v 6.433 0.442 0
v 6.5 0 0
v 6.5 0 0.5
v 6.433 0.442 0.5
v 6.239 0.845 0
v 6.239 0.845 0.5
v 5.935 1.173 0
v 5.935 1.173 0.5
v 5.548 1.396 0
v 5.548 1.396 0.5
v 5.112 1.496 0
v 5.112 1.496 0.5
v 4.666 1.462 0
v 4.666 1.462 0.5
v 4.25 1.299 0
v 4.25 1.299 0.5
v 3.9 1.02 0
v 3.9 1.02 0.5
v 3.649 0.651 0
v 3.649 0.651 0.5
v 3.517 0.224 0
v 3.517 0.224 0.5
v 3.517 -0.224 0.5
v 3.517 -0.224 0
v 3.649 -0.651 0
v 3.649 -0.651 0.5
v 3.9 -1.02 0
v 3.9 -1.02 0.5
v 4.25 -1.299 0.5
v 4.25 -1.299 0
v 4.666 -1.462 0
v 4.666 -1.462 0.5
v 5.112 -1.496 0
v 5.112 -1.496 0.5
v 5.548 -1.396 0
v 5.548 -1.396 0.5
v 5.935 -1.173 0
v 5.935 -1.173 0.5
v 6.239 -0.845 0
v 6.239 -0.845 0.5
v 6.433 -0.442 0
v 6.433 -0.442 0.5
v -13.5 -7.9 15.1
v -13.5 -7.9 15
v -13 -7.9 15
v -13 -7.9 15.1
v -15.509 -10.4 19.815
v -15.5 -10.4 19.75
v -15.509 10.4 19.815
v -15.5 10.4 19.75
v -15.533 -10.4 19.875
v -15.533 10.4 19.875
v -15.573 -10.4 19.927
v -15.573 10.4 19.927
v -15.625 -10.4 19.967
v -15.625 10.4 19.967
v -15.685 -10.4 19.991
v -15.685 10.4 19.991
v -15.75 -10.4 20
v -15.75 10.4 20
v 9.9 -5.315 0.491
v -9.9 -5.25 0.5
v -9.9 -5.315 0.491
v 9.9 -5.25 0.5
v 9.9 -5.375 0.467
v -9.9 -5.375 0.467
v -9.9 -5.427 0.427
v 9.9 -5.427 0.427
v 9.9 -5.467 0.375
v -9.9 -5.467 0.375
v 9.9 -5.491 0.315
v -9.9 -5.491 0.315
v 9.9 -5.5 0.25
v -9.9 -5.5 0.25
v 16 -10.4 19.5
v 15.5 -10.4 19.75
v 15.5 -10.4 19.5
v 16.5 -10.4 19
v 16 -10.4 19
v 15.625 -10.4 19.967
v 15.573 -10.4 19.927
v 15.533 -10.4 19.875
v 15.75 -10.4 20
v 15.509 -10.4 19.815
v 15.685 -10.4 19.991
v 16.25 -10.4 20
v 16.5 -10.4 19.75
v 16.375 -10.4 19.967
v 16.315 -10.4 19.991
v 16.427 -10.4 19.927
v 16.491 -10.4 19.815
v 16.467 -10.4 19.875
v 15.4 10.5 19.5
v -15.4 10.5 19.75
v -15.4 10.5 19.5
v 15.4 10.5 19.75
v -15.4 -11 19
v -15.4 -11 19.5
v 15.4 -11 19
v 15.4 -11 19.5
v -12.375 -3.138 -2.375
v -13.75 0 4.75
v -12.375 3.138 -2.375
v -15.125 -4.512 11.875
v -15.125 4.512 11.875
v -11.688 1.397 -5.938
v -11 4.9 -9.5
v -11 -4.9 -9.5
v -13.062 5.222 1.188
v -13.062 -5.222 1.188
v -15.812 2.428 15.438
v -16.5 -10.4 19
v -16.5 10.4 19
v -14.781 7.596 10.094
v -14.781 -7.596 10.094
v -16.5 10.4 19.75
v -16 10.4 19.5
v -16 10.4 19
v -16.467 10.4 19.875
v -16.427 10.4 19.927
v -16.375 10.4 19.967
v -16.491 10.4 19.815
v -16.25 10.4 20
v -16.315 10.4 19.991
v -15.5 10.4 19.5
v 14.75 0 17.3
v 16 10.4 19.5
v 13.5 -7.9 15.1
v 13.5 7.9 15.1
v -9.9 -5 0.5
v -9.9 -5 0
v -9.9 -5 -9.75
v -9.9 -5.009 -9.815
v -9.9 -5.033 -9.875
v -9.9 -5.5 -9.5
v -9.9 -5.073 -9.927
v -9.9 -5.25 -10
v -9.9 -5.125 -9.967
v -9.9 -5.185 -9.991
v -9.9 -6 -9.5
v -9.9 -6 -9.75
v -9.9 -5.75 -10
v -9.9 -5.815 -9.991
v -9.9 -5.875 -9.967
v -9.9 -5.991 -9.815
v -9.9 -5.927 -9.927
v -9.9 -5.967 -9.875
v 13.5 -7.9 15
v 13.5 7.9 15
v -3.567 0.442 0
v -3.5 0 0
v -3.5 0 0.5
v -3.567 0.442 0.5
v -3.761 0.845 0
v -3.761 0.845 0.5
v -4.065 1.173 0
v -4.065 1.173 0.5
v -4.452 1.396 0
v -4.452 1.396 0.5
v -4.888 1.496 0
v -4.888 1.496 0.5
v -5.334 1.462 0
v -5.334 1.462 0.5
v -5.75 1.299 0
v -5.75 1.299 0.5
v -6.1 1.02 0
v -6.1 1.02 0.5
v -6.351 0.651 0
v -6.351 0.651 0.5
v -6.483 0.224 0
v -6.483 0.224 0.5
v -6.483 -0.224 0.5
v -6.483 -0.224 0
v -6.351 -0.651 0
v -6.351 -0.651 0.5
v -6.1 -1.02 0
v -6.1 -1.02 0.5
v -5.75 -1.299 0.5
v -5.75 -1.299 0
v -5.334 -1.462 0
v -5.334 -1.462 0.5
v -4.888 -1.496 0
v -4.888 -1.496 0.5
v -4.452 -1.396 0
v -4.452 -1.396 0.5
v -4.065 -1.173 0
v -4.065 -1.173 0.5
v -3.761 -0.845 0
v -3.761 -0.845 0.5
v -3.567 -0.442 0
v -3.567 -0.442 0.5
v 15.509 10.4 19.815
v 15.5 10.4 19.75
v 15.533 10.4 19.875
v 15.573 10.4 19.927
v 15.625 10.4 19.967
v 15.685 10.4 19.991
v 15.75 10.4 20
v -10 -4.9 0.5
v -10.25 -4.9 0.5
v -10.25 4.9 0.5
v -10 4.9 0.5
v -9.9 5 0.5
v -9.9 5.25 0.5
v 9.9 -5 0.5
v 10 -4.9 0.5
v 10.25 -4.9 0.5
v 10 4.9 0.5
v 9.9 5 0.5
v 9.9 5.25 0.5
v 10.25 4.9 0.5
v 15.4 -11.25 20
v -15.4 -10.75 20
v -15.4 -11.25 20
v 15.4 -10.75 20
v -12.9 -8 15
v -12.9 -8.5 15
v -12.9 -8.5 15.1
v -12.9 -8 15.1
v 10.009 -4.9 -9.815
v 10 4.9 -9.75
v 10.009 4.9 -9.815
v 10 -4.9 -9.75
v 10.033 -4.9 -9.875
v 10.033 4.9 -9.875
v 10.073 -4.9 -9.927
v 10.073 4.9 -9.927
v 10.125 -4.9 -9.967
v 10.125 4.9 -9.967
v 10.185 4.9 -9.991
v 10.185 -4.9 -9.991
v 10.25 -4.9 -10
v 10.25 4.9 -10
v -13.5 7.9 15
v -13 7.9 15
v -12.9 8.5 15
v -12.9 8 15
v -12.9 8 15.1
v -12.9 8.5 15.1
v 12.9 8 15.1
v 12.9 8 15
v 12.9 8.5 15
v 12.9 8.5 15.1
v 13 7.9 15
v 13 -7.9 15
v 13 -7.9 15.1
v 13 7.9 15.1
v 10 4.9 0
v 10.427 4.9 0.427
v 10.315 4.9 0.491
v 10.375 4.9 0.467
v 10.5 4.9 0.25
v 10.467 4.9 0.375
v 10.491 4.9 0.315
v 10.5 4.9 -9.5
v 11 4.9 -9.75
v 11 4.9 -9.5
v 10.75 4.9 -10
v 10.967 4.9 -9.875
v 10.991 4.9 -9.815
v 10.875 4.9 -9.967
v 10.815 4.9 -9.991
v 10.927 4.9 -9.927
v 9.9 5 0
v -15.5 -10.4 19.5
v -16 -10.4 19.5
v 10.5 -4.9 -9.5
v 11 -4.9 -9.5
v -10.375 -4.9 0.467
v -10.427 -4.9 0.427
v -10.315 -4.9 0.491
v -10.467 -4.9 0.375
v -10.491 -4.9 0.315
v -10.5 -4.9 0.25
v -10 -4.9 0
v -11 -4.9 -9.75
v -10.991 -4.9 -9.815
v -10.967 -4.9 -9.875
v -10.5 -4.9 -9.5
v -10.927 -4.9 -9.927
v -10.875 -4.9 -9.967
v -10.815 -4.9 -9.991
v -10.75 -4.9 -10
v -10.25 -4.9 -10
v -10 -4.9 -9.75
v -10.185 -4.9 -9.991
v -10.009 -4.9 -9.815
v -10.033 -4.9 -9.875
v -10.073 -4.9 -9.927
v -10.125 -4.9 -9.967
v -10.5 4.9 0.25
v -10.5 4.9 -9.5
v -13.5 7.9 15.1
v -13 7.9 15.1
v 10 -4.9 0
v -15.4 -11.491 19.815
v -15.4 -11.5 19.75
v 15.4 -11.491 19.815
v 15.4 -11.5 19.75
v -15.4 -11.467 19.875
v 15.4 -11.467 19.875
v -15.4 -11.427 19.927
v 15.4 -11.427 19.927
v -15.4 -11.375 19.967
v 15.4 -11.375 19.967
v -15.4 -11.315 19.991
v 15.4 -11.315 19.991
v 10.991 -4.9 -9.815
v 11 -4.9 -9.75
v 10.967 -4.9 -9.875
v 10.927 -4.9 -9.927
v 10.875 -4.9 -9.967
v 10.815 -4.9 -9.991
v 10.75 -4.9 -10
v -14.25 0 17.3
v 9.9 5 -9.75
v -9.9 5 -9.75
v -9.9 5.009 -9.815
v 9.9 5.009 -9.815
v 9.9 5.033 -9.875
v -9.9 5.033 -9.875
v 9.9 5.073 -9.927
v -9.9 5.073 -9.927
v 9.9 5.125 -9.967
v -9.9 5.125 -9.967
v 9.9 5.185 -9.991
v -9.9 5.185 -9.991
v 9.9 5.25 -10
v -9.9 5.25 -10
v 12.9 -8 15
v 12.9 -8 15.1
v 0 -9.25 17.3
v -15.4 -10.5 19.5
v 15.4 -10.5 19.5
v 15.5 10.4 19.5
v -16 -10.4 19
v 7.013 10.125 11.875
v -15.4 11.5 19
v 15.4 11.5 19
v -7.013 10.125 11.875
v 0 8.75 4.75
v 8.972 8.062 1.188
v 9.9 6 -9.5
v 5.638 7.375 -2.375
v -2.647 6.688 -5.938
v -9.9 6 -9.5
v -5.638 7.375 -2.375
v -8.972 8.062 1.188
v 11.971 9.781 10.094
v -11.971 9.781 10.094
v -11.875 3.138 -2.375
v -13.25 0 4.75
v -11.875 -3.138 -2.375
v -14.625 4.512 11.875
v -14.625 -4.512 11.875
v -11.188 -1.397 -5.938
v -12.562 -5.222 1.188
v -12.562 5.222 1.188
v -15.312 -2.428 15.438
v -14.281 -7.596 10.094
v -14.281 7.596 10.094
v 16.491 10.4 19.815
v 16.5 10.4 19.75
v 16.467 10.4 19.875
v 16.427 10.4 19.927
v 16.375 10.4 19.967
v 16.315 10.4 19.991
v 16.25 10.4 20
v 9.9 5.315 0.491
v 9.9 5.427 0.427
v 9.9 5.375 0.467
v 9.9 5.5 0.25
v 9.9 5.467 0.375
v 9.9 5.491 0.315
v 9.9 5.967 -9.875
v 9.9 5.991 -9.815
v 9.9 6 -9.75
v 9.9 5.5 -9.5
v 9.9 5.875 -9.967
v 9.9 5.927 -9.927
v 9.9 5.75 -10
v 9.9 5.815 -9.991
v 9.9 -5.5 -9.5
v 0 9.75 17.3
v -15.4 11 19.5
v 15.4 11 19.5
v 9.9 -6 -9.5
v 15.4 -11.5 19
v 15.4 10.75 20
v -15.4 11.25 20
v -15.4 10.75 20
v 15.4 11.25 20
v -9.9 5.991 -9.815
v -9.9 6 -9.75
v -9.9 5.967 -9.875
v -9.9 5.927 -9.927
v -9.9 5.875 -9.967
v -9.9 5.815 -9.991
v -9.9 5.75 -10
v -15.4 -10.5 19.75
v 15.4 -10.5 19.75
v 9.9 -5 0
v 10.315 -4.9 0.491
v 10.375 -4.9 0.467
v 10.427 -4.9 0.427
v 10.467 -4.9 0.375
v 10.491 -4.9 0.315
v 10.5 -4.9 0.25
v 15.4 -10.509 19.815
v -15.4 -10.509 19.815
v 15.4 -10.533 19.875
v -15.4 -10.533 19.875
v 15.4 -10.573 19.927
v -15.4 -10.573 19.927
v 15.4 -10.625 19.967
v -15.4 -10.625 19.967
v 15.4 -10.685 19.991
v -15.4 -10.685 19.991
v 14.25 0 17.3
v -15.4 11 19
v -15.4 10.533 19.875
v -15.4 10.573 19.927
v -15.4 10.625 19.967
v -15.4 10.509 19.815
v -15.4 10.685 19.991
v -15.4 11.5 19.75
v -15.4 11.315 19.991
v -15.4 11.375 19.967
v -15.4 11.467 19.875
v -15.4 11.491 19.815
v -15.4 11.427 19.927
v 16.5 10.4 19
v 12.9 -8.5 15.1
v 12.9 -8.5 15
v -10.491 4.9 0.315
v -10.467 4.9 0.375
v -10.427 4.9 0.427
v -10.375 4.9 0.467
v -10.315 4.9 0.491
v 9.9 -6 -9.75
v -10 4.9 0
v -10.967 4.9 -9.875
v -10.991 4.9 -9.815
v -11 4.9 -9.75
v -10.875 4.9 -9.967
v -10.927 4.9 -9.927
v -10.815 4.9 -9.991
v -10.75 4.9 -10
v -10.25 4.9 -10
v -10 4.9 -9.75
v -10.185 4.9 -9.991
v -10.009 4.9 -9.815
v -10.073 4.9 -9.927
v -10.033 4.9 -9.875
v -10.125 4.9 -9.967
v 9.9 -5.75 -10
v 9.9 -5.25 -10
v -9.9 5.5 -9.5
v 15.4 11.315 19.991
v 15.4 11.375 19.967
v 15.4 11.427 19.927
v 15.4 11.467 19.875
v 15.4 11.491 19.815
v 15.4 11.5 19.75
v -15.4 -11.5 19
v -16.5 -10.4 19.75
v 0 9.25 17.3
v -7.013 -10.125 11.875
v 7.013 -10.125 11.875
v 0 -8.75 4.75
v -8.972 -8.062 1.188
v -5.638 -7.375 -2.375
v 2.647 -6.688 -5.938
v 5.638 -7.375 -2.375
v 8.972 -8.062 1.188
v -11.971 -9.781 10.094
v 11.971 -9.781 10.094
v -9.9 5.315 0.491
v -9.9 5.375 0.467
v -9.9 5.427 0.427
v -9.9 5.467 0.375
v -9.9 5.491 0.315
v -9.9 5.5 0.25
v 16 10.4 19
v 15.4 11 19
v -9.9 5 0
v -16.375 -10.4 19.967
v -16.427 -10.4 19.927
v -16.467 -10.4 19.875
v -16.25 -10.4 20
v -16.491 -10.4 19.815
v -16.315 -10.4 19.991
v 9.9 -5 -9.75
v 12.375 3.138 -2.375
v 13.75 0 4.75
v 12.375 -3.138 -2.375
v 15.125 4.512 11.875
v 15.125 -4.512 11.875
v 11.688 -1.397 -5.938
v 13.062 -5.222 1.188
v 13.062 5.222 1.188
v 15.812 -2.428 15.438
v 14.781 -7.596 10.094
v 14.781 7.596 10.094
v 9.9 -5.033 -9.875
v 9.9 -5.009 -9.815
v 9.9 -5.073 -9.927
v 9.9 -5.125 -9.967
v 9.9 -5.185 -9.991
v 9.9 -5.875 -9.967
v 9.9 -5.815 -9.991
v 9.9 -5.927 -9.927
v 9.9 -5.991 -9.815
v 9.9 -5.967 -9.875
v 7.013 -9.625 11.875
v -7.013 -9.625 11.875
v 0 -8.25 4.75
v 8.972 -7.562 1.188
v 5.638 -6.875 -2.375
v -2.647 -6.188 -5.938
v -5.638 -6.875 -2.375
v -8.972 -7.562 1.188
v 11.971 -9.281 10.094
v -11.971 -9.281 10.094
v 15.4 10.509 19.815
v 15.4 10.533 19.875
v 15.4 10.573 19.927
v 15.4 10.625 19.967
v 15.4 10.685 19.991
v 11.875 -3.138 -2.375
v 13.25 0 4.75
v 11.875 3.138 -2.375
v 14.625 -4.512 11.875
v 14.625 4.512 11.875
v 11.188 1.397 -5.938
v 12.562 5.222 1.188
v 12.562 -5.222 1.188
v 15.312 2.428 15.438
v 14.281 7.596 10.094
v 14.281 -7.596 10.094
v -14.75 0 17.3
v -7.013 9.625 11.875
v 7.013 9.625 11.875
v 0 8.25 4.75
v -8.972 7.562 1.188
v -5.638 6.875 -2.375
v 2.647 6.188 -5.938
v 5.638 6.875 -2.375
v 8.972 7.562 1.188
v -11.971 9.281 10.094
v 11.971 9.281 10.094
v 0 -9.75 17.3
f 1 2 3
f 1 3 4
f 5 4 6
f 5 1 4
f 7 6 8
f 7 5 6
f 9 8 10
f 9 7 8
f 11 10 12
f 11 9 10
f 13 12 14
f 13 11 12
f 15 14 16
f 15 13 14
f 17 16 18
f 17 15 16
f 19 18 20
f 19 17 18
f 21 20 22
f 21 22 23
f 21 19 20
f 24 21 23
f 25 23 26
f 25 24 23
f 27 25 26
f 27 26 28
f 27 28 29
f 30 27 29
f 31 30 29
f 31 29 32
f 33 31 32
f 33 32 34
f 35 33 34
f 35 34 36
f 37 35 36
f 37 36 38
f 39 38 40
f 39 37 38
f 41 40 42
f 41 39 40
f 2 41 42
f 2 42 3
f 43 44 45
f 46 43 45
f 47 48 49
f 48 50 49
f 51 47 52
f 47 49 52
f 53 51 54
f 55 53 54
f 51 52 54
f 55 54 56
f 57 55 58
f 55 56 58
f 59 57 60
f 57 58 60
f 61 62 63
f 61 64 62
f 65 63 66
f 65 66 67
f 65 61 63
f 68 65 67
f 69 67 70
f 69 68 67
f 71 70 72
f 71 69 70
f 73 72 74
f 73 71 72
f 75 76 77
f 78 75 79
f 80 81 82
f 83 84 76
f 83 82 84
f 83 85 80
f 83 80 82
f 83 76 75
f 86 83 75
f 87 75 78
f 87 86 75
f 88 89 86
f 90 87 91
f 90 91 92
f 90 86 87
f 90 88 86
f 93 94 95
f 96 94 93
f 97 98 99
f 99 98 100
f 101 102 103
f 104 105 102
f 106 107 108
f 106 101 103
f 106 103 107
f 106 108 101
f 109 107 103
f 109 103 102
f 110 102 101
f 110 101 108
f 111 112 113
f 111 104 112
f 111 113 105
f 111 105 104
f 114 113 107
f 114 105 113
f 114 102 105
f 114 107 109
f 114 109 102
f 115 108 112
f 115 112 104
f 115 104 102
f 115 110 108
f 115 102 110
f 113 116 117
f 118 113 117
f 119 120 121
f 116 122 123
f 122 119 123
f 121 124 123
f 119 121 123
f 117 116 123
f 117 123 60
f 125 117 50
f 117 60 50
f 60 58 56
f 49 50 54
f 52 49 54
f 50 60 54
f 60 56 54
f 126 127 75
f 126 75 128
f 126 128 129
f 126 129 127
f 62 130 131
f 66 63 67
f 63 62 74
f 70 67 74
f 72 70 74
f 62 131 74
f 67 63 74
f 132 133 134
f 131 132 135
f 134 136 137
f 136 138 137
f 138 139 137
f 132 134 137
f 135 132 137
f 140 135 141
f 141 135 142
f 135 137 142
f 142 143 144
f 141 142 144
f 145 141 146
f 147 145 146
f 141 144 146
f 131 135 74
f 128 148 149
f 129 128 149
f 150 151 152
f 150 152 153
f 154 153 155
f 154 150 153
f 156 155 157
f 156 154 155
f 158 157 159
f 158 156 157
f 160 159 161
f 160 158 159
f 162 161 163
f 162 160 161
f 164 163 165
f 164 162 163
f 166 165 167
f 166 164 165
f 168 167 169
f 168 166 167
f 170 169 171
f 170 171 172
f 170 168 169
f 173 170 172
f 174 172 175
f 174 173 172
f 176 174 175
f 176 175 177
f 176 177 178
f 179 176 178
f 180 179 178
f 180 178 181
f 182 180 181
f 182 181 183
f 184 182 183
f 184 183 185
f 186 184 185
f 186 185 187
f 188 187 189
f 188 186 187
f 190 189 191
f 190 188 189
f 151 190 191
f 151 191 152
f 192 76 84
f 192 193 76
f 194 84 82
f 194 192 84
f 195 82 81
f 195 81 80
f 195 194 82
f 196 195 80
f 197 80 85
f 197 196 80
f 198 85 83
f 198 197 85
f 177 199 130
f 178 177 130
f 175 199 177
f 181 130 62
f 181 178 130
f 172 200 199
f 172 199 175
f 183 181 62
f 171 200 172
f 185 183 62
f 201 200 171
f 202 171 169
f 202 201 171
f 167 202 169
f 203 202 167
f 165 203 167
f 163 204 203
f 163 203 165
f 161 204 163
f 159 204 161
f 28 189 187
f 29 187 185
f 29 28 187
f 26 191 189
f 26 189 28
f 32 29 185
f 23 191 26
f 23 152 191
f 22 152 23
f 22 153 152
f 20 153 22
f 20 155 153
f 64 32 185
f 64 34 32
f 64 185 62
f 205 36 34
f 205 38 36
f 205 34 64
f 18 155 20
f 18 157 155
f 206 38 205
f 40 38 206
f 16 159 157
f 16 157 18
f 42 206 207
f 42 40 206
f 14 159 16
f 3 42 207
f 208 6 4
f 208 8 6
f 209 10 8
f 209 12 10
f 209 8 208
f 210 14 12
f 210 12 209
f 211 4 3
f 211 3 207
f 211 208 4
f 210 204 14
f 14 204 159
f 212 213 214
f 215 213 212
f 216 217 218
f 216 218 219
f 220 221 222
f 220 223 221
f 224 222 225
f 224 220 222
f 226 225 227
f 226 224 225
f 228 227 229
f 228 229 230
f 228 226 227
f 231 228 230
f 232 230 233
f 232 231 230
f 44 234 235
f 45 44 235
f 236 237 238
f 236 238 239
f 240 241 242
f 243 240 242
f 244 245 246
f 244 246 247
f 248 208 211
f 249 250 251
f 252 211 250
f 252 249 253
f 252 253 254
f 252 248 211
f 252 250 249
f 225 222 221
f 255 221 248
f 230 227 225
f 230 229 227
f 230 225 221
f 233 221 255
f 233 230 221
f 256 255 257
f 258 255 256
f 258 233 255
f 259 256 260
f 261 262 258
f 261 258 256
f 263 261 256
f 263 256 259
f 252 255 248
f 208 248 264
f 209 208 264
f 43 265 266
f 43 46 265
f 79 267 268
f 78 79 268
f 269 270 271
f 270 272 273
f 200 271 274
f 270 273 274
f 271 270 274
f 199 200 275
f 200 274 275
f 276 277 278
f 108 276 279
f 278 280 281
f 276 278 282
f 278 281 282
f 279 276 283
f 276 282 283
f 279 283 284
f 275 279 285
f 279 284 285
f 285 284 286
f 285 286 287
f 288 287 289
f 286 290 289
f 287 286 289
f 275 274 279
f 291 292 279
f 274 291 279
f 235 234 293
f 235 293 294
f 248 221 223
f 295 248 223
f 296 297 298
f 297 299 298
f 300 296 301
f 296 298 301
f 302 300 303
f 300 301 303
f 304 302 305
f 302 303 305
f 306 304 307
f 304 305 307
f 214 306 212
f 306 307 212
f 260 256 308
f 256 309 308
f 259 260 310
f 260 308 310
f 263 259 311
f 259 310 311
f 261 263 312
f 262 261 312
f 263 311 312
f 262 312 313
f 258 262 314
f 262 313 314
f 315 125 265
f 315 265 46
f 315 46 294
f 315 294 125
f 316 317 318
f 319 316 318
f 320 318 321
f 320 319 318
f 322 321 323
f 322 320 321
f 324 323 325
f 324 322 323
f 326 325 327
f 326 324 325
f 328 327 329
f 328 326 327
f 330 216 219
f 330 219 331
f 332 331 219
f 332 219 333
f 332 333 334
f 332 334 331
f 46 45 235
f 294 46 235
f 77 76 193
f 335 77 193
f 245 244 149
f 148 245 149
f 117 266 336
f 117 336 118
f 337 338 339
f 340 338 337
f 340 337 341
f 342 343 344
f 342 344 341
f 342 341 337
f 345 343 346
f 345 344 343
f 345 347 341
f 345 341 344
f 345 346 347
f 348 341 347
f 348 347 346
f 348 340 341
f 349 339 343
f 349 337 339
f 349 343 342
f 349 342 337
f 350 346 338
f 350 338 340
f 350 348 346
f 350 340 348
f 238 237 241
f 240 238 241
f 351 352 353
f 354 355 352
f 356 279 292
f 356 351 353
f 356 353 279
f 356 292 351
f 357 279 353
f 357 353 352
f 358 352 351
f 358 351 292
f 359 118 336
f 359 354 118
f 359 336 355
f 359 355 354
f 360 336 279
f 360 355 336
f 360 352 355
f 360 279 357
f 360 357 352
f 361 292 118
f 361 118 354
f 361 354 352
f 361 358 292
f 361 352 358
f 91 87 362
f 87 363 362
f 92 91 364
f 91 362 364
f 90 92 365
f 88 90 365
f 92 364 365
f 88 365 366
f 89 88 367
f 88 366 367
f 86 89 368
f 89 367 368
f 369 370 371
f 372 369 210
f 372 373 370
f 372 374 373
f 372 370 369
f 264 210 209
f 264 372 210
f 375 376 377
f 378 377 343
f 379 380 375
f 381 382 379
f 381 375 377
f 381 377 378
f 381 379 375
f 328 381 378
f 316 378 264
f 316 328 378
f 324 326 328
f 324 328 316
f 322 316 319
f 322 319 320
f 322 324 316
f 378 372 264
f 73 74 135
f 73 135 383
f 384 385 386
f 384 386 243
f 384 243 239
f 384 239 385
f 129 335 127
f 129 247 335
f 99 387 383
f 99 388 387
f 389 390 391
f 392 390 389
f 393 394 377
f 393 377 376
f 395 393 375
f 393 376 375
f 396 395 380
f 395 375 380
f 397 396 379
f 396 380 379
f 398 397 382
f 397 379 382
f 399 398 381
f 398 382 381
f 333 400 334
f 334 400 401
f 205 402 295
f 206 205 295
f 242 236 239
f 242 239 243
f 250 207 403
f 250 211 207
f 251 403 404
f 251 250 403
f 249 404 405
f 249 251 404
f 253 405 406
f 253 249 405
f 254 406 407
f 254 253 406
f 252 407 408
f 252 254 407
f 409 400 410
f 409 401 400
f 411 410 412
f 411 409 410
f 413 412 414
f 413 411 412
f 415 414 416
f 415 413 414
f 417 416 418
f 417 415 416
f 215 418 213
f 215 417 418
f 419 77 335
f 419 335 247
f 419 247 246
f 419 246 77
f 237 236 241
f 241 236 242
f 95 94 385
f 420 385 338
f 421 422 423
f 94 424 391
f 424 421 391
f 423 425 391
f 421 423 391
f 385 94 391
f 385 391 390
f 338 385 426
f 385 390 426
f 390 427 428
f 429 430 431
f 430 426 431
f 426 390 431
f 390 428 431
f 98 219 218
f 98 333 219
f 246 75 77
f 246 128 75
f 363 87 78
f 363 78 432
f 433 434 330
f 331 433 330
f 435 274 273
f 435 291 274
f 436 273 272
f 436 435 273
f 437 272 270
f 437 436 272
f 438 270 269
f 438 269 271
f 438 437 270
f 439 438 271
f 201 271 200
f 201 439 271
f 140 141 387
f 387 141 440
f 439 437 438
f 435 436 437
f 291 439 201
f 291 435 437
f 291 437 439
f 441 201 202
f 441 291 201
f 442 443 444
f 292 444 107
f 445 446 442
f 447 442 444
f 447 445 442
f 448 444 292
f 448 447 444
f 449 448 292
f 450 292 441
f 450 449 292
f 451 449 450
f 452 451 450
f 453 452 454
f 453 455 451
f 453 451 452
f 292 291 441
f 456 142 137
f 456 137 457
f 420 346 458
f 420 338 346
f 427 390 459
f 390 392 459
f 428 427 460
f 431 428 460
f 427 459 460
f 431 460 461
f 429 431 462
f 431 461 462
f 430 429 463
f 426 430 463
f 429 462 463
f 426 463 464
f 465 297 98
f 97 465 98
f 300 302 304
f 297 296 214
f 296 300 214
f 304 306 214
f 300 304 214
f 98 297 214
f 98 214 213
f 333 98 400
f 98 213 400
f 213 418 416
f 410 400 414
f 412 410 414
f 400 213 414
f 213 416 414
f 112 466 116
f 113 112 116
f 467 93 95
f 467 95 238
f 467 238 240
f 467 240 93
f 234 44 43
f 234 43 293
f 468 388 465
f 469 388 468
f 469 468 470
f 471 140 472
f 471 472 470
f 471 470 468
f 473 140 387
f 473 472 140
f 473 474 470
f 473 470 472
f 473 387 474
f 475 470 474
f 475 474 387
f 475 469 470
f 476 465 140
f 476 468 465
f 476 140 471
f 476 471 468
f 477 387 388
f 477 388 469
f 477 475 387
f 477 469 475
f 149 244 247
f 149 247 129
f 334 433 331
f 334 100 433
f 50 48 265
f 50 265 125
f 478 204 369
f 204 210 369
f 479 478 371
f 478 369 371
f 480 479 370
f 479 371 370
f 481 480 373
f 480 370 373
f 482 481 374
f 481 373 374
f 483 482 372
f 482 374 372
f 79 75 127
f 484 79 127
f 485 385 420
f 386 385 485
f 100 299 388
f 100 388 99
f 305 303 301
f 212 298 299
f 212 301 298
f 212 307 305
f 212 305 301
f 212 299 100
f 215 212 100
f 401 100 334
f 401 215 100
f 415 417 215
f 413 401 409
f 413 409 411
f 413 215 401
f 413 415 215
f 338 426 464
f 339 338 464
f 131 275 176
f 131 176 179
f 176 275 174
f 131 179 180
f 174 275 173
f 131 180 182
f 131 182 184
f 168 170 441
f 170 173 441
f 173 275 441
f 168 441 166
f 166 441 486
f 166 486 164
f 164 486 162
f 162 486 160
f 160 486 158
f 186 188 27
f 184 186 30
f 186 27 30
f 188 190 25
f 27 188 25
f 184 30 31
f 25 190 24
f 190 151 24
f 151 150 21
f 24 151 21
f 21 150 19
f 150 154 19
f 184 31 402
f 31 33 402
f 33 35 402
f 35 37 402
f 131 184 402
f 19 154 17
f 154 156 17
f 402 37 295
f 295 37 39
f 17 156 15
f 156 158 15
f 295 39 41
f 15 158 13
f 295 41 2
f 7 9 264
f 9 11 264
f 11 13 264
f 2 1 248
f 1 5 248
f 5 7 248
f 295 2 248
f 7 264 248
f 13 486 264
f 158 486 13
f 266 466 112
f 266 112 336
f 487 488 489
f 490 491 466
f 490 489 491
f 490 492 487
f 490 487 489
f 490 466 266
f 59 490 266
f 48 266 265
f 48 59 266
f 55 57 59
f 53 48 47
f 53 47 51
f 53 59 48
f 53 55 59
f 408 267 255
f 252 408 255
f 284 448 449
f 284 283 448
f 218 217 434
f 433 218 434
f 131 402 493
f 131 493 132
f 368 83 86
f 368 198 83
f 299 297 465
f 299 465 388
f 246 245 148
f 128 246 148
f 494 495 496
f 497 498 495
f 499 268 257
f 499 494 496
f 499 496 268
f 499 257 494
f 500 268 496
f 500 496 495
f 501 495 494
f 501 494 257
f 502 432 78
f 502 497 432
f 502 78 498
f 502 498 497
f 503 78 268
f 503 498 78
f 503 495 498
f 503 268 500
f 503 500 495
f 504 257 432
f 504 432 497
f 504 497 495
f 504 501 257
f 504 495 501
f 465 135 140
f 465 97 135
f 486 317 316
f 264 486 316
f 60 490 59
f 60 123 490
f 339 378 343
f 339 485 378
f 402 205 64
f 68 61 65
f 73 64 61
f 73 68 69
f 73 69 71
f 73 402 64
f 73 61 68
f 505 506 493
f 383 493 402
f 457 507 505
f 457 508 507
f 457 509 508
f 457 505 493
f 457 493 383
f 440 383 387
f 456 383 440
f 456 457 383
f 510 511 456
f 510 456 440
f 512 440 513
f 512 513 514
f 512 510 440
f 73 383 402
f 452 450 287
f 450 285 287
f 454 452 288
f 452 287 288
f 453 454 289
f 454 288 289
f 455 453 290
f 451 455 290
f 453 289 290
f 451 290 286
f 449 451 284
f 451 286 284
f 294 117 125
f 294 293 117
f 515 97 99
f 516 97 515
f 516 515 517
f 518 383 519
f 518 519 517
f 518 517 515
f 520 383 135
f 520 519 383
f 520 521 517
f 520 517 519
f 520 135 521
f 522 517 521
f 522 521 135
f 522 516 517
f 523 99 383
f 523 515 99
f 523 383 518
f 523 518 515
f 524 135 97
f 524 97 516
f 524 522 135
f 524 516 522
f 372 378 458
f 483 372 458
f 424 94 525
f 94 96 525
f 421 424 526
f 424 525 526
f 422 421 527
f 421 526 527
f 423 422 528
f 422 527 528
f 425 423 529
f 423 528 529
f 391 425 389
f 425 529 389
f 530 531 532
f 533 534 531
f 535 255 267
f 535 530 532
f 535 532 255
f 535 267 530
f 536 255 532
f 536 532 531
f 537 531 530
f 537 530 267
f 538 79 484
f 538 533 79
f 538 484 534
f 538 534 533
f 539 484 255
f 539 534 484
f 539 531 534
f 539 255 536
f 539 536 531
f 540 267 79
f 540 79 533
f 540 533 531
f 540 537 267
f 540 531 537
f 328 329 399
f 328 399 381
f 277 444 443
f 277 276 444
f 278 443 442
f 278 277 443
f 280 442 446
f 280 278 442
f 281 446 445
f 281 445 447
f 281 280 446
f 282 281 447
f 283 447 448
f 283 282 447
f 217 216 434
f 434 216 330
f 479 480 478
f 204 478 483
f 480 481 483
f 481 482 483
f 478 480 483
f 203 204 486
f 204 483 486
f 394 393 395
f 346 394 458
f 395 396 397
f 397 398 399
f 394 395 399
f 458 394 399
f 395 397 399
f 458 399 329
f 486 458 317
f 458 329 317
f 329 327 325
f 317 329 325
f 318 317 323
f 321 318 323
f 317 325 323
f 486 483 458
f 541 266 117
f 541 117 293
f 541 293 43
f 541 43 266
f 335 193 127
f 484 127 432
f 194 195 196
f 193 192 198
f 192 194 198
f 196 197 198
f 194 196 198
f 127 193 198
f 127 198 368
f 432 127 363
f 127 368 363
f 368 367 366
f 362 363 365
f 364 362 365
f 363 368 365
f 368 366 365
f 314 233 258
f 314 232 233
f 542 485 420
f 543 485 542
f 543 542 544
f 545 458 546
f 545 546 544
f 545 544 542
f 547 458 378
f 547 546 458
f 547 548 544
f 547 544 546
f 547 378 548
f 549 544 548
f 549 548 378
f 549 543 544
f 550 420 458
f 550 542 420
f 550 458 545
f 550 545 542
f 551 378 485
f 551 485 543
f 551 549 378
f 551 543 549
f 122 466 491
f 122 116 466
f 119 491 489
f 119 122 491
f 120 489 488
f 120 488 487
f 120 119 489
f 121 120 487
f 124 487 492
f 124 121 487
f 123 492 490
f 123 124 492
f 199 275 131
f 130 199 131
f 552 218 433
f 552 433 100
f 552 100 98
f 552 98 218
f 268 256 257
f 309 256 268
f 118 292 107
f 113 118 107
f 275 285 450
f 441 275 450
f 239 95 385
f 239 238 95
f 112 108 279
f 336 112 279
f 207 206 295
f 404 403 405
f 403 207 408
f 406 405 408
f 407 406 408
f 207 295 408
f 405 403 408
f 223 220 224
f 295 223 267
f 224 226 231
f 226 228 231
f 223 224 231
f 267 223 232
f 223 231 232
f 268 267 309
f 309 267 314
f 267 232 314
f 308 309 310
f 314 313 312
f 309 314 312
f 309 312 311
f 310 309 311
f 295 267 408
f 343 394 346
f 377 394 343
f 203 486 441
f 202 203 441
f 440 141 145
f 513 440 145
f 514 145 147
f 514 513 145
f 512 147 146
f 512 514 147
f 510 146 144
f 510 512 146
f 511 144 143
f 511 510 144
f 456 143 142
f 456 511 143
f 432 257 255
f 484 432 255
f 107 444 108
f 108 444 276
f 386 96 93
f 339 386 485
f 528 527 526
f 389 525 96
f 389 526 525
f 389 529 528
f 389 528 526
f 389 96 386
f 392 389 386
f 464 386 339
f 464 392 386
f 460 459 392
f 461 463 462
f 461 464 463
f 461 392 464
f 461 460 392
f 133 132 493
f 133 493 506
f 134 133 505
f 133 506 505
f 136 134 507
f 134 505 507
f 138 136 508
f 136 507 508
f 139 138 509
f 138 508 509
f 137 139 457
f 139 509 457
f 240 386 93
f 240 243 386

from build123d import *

# Parameters (mm, degrees)
F0_W         = 19.8
F0_H         = 0.5
F0_R         = 1.5
F0_W_2       = 0.5
F0_H_2       = 9.8
F1_DEPTH     = 0.5
F3_W         = 0.5
F3_H         = 9.8
F4_DEPTH     = 1
F3_W_2       = 19.8
F3_H_2       = 0.5
F5_DEPTH     = 0.5
F4_FACE_W    = 19.8
F4_FACE_H    = 0.5
F4_FACE_W_2  = 0.5
F4_FACE_H_2  = 9.8
F11_R        = 0.25
F11_2_R      = 0.25
F11_3_R      = 0.25
F11_4_R      = 0.25
F11_5_R      = 0.25
F2_W         = 30.8
F2_H         = 0.5
F12_DEPTH    = 1
F2_W_2       = 0.5
F2_H_2       = 20.8
F13_DEPTH    = 0.5
F5_FACE_W    = 0.5
F5_FACE_H    = 9.8
F12_FACE_W   = 0.5
F12_FACE_H   = 20.8
F5_FACE_W_2  = 19.8
F5_FACE_H_2  = 0.5
F12_FACE_W_2 = 30.8
F12_FACE_H_2 = 0.5
F19_W        = 0.5
F19_H        = 15.8
F20_DEPTH    = 0.1
F19_W_2      = 25.8
F19_H_2      = 0.5
F13_FACE_W   = 0.5
F13_FACE_H   = 20.8
F20_FACE_W   = 0.5
F20_FACE_H   = 15.8
F13_FACE_W_2 = 30.8
F13_FACE_H_2 = 0.5
F20_FACE_W_2 = 25.8
F20_FACE_H_2 = 0.5
F26_R        = 0.25
F27_R        = 0.25
F28_R        = 0.25


with BuildPart() as f1:
    # F0 (on Top) → F1 (new body)
    with BuildSketch(Plane.XY):
        with Locations((0, 5.25)):
            Rectangle(F0_W, F0_H)
        Polygon((9.9, 5), (-9.9, 5), (-10, 4.9), (-10, -4.9), (-9.9, -5), (9.9, -5), (10, -4.9), (10, 4.9), align=None)
        with Locations((-5, 0)):
            Circle(F0_R, mode=Mode.SUBTRACT)
        with Locations((5, 0)):
            Circle(F0_R, mode=Mode.SUBTRACT)
        with Locations((-10.25, 0)):
            Rectangle(F0_W_2, F0_H_2)
        with Locations((10.25, 0)):
            Rectangle(F0_W_2, F0_H_2)
        with Locations((0, -5.25)):
            Rectangle(F0_W, F0_H)
    extrude(amount=F1_DEPTH)



with BuildPart() as f4:
    # F3 (on face) → F4 (new body)
    with BuildSketch(Plane(origin=(0, 0, 0), x_dir=(1, 0, 0), z_dir=(0, 0, -1))):
        with Locations((10.25, 0)):
            Rectangle(F3_W, F3_H)
    extrude(amount=-F4_DEPTH)


with BuildPart() as f4b:
    # F3 (on face) → F4, piece 2 (new body)
    with BuildSketch(Plane(origin=(0, 0, 0), x_dir=(1, 0, 0), z_dir=(0, 0, -1))):
        with Locations((0, -5.25)):
            Rectangle(F3_W_2, F3_H_2)
    extrude(amount=-F4_DEPTH)


with BuildPart() as f4c:
    # F3 (on face) → F4, piece 3 (new body)
    with BuildSketch(Plane(origin=(0, 0, 0), x_dir=(1, 0, 0), z_dir=(0, 0, -1))):
        with Locations((0, 5.25)):
            Rectangle(F3_W_2, F3_H_2)
    extrude(amount=-F4_DEPTH)


with BuildPart() as f4d:
    # F3 (on face) → F4, piece 4 (new body)
    with BuildSketch(Plane(origin=(0, 0, 0), x_dir=(1, 0, 0), z_dir=(0, 0, -1))):
        with Locations((-10.25, 0)):
            Rectangle(F3_W, F3_H)
    extrude(amount=-F4_DEPTH)


with BuildPart() as f5:
    # F3 (on face) → F5 (new body)
    with BuildSketch(Plane(origin=(0, 0, 0), x_dir=(1, 0, 0), z_dir=(0, 0, -1))):
        with Locations((0, -5.75)):
            Rectangle(F3_W_2, F3_H_2)
    extrude(amount=-F5_DEPTH)


with BuildPart() as f5b:
    # F3 (on face) → F5, piece 2 (new body)
    with BuildSketch(Plane(origin=(0, 0, 0), x_dir=(1, 0, 0), z_dir=(0, 0, -1))):
        with Locations((0, 5.75)):
            Rectangle(F3_W_2, F3_H_2)
    extrude(amount=-F5_DEPTH)


with BuildPart() as f5c:
    # F3 (on face) → F5, piece 3 (new body)
    with BuildSketch(Plane(origin=(0, 0, 0), x_dir=(1, 0, 0), z_dir=(0, 0, -1))):
        with Locations((-10.75, 0)):
            Rectangle(F3_W, F3_H)
    extrude(amount=-F5_DEPTH)


with BuildPart() as f5d:
    # F3 (on face) → F5, piece 4 (new body)
    with BuildSketch(Plane(origin=(0, 0, 0), x_dir=(1, 0, 0), z_dir=(0, 0, -1))):
        with Locations((10.75, 0)):
            Rectangle(F3_W, F3_H)
    extrude(amount=-F5_DEPTH)


with BuildPart() as f4c_1:
    # F6: moved
    add(f4c.part.moved(Location((0, 0, -10))))


with BuildPart() as f5b_1:
    # F6: moved
    add(f5b.part.moved(Location((0, 0, -10))))

    # F11#3
    f11_3_edges = [f5b_1.edges().sort_by_distance(p)[0] for p in [
        (0, -6, -10),
    ]]
    fillet(f11_3_edges, radius=F11_3_R)


with BuildPart() as f5d_1:
    # F6: moved
    add(f5d.part.moved(Location((0, 0, -10))))

    # F11#5
    f11_5_edges = [f5d_1.edges().sort_by_distance(p)[0] for p in [
        (11, 0, -10),
    ]]
    fillet(f11_5_edges, radius=F11_5_R)


with BuildPart() as f4_1:
    # F6: moved
    add(f4.part.moved(Location((0, 0, -10))))


with BuildPart() as f5_1:
    # F6: moved
    add(f5.part.moved(Location((0, 0, -10))))

    # F11#2
    f11_2_edges = [f5_1.edges().sort_by_distance(p)[0] for p in [
        (0, 6, -10),
    ]]
    fillet(f11_2_edges, radius=F11_2_R)


with BuildPart() as f4b_1:
    # F6: moved
    add(f4b.part.moved(Location((0, 0, -10))))


with BuildPart() as f5c_1:
    # F6: moved
    add(f5c.part.moved(Location((0, 0, -10))))

    # F11#4
    f11_4_edges = [f5c_1.edges().sort_by_distance(p)[0] for p in [
        (-11, 0, -10),
    ]]
    fillet(f11_4_edges, radius=F11_4_R)


with BuildPart() as f4d_1:
    # F6: moved
    add(f4d.part.moved(Location((0, 0, -10))))


with BuildPart() as f1_1:
    add(f1.part)

    add(f4c_1.part)  # F7 merges F4c
    # F4_face (on face) → F7 section 0
    with BuildSketch(Plane(origin=(0, -5.25, -9), x_dir=(1, 0, 0), z_dir=(0, 0, 1))):
        Rectangle(F4_FACE_W, F4_FACE_H)
    # F0 (on Top) → F7 section 1
    with BuildSketch(Plane.XY):
        with Locations((0, -5.25)):
            Rectangle(F0_W, F0_H)
    loft()


    add(f4_1.part)  # F8 merges F4
    # F0 (on Top) → F8 section 0
    with BuildSketch(Plane.XY):
        with Locations((10.25, 0)):
            Rectangle(F0_W_2, F0_H_2)
    # F4_face (on face) → F8 section 1
    with BuildSketch(Plane(origin=(0, -5.25, -9), x_dir=(1, 0, 0), z_dir=(0, 0, 1))):
        with Locations((10.25, 5.25)):
            Rectangle(F4_FACE_W_2, F4_FACE_H_2)
    loft()


    add(f4b_1.part)  # F9 merges F4b
    # F0 (on Top) → F9 section 0
    with BuildSketch(Plane.XY):
        with Locations((0, 5.25)):
            Rectangle(F0_W, F0_H)
    # F4_face (on face) → F9 section 1
    with BuildSketch(Plane(origin=(0, -5.25, -9), x_dir=(1, 0, 0), z_dir=(0, 0, 1))):
        with Locations((0, 10.5)):
            Rectangle(F4_FACE_W, F4_FACE_H)
    loft()


    add(f4d_1.part)  # F10 merges F4d
    # F0 (on Top) → F10 section 0
    with BuildSketch(Plane.XY):
        with Locations((-10.25, 0)):
            Rectangle(F0_W_2, F0_H_2)
    # F4_face (on face) → F10 section 1
    with BuildSketch(Plane(origin=(0, -5.25, -9), x_dir=(1, 0, 0), z_dir=(0, 0, 1))):
        with Locations((-10.25, 5.25)):
            Rectangle(F4_FACE_W_2, F4_FACE_H_2)
    loft()

    # F11
    f11_edges = [f1_1.edges().sort_by_distance(p)[0] for p in [
        (10.5, 0, 0.5),
        (0, -5.5, 0.5),
        (0, 5.5, 0.5),
        (-10.5, 0, 0.5),
        (-10, 0, -10),
        (0, 5, -10),
        (10, 0, -10),
        (0, -5, -10),
    ]]
    fillet(f11_edges, radius=F11_R)


    add(f5c_1.part)  # F15 merges F5c


with BuildPart() as f12:
    # F2 (on Top) → F12 (new body)
    with BuildSketch(Plane.XY):
        with Locations((0, 11.25)):
            Rectangle(F2_W, F2_H)
    extrude(amount=-F12_DEPTH)


with BuildPart() as f12b:
    # F2 (on Top) → F12, piece 2 (new body)
    with BuildSketch(Plane.XY):
        with Locations((-16.25, 0)):
            Rectangle(F2_W_2, F2_H_2)
    extrude(amount=-F12_DEPTH)


with BuildPart() as f12c:
    # F2 (on Top) → F12, piece 3 (new body)
    with BuildSketch(Plane.XY):
        with Locations((0, -11.25)):
            Rectangle(F2_W, F2_H)
    extrude(amount=-F12_DEPTH)


with BuildPart() as f12d:
    # F2 (on Top) → F12, piece 4 (new body)
    with BuildSketch(Plane.XY):
        with Locations((16.25, 0)):
            Rectangle(F2_W_2, F2_H_2)
    extrude(amount=-F12_DEPTH)


with BuildPart() as f13:
    # F2 (on Top) → F13 (new body)
    with BuildSketch(Plane.XY):
        with Locations((-15.75, 0)):
            Rectangle(F2_W_2, F2_H_2)
    extrude(amount=-F13_DEPTH)


with BuildPart() as f13b:
    # F2 (on Top) → F13, piece 2 (new body)
    with BuildSketch(Plane.XY):
        with Locations((0, 10.75)):
            Rectangle(F2_W, F2_H)
    extrude(amount=-F13_DEPTH)


with BuildPart() as f13c:
    # F2 (on Top) → F13, piece 3 (new body)
    with BuildSketch(Plane.XY):
        with Locations((15.75, 0)):
            Rectangle(F2_W_2, F2_H_2)
    extrude(amount=-F13_DEPTH)


with BuildPart() as f13d:
    # F2 (on Top) → F13, piece 4 (new body)
    with BuildSketch(Plane.XY):
        with Locations((0, -10.75)):
            Rectangle(F2_W, F2_H)
    extrude(amount=-F13_DEPTH)


with BuildPart() as f13b_1:
    # F14: moved
    add(f13b.part.moved(Location((0, 0, 20))))


with BuildPart() as f12_1:
    # F14: moved
    add(f12.part.moved(Location((0, 0, 20))))


with BuildPart() as f12b_1:
    # F14: moved
    add(f12b.part.moved(Location((0, 0, 20))))


with BuildPart() as f13_1:
    # F14: moved
    add(f13.part.moved(Location((0, 0, 20))))


with BuildPart() as f13d_1:
    # F14: moved
    add(f13d.part.moved(Location((0, 0, 20))))


with BuildPart() as f12c_1:
    # F14: moved
    add(f12c.part.moved(Location((0, 0, 20))))


with BuildPart() as f13c_1:
    # F14: moved
    add(f13c.part.moved(Location((0, 0, 20))))


with BuildPart() as f12d_1:
    # F14: moved
    add(f12d.part.moved(Location((0, 0, 20))))


with BuildPart() as f1_2:
    add(f1_1.part)

    add(f12b_1.part)  # F15 merges F12b
    # F5_face (on face) → F15 section 0
    with BuildSketch(Plane(origin=(-10.75, 0, -9.5), x_dir=(1, 0, 0), z_dir=(0, 0, 1))):
        Rectangle(F5_FACE_W, F5_FACE_H)
    # F12_face (on face) → F15 section 1
    with BuildSketch(Plane(origin=(-16.25, 0, 19), x_dir=(1, 0, 0), z_dir=(0, 0, -1))):
        Rectangle(F12_FACE_W, F12_FACE_H)
    loft()


    add(f5b_1.part)  # F16 merges F5b

    add(f12c_1.part)  # F16 merges F12c
    # F5_face (on face) → F16 section 0
    with BuildSketch(Plane(origin=(-10.75, 0, -9.5), x_dir=(1, 0, 0), z_dir=(0, 0, 1))):
        with Locations((10.75, -5.75)):
            Rectangle(F5_FACE_W_2, F5_FACE_H_2)
    # F12_face (on face) → F16 section 1
    with BuildSketch(Plane(origin=(-16.25, 0, 19), x_dir=(1, 0, 0), z_dir=(0, 0, -1))):
        with Locations((16.25, 11.25)):
            Rectangle(F12_FACE_W_2, F12_FACE_H_2)
    loft()


    add(f5d_1.part)  # F17 merges F5d

    add(f12d_1.part)  # F17 merges F12d
    # F5_face (on face) → F17 section 0
    with BuildSketch(Plane(origin=(-10.75, 0, -9.5), x_dir=(1, 0, 0), z_dir=(0, 0, 1))):
        with Locations((21.5, 0)):
            Rectangle(F5_FACE_W, F5_FACE_H)
    # F12_face (on face) → F17 section 1
    with BuildSketch(Plane(origin=(-16.25, 0, 19), x_dir=(1, 0, 0), z_dir=(0, 0, -1))):
        with Locations((32.5, 0)):
            Rectangle(F12_FACE_W, F12_FACE_H)
    loft()


    add(f5_1.part)  # F18 merges F5

    add(f12_1.part)  # F18 merges F12
    # F5_face (on face) → F18 section 0
    with BuildSketch(Plane(origin=(-10.75, 0, -9.5), x_dir=(1, 0, 0), z_dir=(0, 0, 1))):
        with Locations((10.75, 5.75)):
            Rectangle(F5_FACE_W_2, F5_FACE_H_2)
    # F12_face (on face) → F18 section 1
    with BuildSketch(Plane(origin=(-16.25, 0, 19), x_dir=(1, 0, 0), z_dir=(0, 0, -1))):
        with Locations((16.25, -11.25)):
            Rectangle(F12_FACE_W_2, F12_FACE_H_2)
    loft()


    add(f13_1.part)  # F22 merges F13


with BuildPart() as f20:
    # F19 (on Top) → F20 (new body)
    with BuildSketch(Plane.XY):
        with Locations((-13.25, 0)):
            Rectangle(F19_W, F19_H)
    extrude(amount=F20_DEPTH)


with BuildPart() as f20b:
    # F19 (on Top) → F20, piece 2 (new body)
    with BuildSketch(Plane.XY):
        with Locations((0, -8.25)):
            Rectangle(F19_W_2, F19_H_2)
    extrude(amount=F20_DEPTH)


with BuildPart() as f20c:
    # F19 (on Top) → F20, piece 3 (new body)
    with BuildSketch(Plane.XY):
        with Locations((13.25, 0)):
            Rectangle(F19_W, F19_H)
    extrude(amount=F20_DEPTH)


with BuildPart() as f20d:
    # F19 (on Top) → F20, piece 4 (new body)
    with BuildSketch(Plane.XY):
        with Locations((0, 8.25)):
            Rectangle(F19_W_2, F19_H_2)
    extrude(amount=F20_DEPTH)


with BuildPart() as f20b_1:
    # F21: moved
    add(f20b.part.moved(Location((0, 0, 15))))


with BuildPart() as f20d_1:
    # F21: moved
    add(f20d.part.moved(Location((0, 0, 15))))


with BuildPart() as f20c_1:
    # F21: moved
    add(f20c.part.moved(Location((0, 0, 15))))


with BuildPart() as f20_1:
    # F21: moved
    add(f20.part.moved(Location((0, 0, 15))))


with BuildPart() as f1_3:
    add(f1_2.part)

    add(f20_1.part)  # F22 merges F20
    # F13_face (on face) → F22 section 0
    with BuildSketch(Plane(origin=(-15.75, 0, 19.5), x_dir=(1, 0, 0), z_dir=(0, 0, -1))):
        Rectangle(F13_FACE_W, F13_FACE_H)
    # F20_face (on face) → F22 section 1
    with BuildSketch(Plane(origin=(-13.25, 0, 15.1), x_dir=(1, 0, 0), z_dir=(0, 0, 1))):
        Rectangle(F20_FACE_W, F20_FACE_H)
    loft()


    add(f13b_1.part)  # F23 merges F13b

    add(f20d_1.part)  # F23 merges F20d
    # F13_face (on face) → F23 section 0
    with BuildSketch(Plane(origin=(-15.75, 0, 19.5), x_dir=(1, 0, 0), z_dir=(0, 0, -1))):
        with Locations((15.75, -10.75)):
            Rectangle(F13_FACE_W_2, F13_FACE_H_2)
    # F20_face (on face) → F23 section 1
    with BuildSketch(Plane(origin=(-13.25, 0, 15.1), x_dir=(1, 0, 0), z_dir=(0, 0, 1))):
        with Locations((13.25, 8.25)):
            Rectangle(F20_FACE_W_2, F20_FACE_H_2)
    loft()


    add(f13d_1.part)  # F24 merges F13d

    add(f20b_1.part)  # F24 merges F20b
    # F20_face (on face) → F24 section 0
    with BuildSketch(Plane(origin=(-13.25, 0, 15.1), x_dir=(1, 0, 0), z_dir=(0, 0, 1))):
        with Locations((13.25, -8.25)):
            Rectangle(F20_FACE_W_2, F20_FACE_H_2)
    # F13_face (on face) → F24 section 1
    with BuildSketch(Plane(origin=(-15.75, 0, 19.5), x_dir=(1, 0, 0), z_dir=(0, 0, -1))):
        with Locations((15.75, 10.75)):
            Rectangle(F13_FACE_W_2, F13_FACE_H_2)
    loft()


    add(f13c_1.part)  # F25 merges F13c

    add(f20c_1.part)  # F25 merges F20c
    # F13_face (on face) → F25 section 0
    with BuildSketch(Plane(origin=(-15.75, 0, 19.5), x_dir=(1, 0, 0), z_dir=(0, 0, -1))):
        with Locations((31.5, 0)):
            Rectangle(F13_FACE_W, F13_FACE_H)
    # F20_face (on face) → F25 section 1
    with BuildSketch(Plane(origin=(-13.25, 0, 15.1), x_dir=(1, 0, 0), z_dir=(0, 0, 1))):
        with Locations((26.5, 0)):
            Rectangle(F20_FACE_W, F20_FACE_H)
    loft()

    # F26
    f26_edges = [f1_3.edges().sort_by_distance(p)[0] for p in [
        (-15.5, 0, 20),
    ]]
    fillet(f26_edges, radius=F26_R)

    # F27
    f27_edges = [f1_3.edges().sort_by_distance(p)[0] for p in [
        (0, 10.5, 20),
        (15.5, 0, 20),
        (0, -10.5, 20),
    ]]
    fillet(f27_edges, radius=F27_R)

    # F28
    f28_edges = [f1_3.edges().sort_by_distance(p)[0] for p in [
        (16.5, 0, 20),
        (0, -11.5, 20),
        (0, 11.5, 20),
        (-16.5, 0, 20),
    ]]
    fillet(f28_edges, radius=F28_R)


solid = f1_3.part
